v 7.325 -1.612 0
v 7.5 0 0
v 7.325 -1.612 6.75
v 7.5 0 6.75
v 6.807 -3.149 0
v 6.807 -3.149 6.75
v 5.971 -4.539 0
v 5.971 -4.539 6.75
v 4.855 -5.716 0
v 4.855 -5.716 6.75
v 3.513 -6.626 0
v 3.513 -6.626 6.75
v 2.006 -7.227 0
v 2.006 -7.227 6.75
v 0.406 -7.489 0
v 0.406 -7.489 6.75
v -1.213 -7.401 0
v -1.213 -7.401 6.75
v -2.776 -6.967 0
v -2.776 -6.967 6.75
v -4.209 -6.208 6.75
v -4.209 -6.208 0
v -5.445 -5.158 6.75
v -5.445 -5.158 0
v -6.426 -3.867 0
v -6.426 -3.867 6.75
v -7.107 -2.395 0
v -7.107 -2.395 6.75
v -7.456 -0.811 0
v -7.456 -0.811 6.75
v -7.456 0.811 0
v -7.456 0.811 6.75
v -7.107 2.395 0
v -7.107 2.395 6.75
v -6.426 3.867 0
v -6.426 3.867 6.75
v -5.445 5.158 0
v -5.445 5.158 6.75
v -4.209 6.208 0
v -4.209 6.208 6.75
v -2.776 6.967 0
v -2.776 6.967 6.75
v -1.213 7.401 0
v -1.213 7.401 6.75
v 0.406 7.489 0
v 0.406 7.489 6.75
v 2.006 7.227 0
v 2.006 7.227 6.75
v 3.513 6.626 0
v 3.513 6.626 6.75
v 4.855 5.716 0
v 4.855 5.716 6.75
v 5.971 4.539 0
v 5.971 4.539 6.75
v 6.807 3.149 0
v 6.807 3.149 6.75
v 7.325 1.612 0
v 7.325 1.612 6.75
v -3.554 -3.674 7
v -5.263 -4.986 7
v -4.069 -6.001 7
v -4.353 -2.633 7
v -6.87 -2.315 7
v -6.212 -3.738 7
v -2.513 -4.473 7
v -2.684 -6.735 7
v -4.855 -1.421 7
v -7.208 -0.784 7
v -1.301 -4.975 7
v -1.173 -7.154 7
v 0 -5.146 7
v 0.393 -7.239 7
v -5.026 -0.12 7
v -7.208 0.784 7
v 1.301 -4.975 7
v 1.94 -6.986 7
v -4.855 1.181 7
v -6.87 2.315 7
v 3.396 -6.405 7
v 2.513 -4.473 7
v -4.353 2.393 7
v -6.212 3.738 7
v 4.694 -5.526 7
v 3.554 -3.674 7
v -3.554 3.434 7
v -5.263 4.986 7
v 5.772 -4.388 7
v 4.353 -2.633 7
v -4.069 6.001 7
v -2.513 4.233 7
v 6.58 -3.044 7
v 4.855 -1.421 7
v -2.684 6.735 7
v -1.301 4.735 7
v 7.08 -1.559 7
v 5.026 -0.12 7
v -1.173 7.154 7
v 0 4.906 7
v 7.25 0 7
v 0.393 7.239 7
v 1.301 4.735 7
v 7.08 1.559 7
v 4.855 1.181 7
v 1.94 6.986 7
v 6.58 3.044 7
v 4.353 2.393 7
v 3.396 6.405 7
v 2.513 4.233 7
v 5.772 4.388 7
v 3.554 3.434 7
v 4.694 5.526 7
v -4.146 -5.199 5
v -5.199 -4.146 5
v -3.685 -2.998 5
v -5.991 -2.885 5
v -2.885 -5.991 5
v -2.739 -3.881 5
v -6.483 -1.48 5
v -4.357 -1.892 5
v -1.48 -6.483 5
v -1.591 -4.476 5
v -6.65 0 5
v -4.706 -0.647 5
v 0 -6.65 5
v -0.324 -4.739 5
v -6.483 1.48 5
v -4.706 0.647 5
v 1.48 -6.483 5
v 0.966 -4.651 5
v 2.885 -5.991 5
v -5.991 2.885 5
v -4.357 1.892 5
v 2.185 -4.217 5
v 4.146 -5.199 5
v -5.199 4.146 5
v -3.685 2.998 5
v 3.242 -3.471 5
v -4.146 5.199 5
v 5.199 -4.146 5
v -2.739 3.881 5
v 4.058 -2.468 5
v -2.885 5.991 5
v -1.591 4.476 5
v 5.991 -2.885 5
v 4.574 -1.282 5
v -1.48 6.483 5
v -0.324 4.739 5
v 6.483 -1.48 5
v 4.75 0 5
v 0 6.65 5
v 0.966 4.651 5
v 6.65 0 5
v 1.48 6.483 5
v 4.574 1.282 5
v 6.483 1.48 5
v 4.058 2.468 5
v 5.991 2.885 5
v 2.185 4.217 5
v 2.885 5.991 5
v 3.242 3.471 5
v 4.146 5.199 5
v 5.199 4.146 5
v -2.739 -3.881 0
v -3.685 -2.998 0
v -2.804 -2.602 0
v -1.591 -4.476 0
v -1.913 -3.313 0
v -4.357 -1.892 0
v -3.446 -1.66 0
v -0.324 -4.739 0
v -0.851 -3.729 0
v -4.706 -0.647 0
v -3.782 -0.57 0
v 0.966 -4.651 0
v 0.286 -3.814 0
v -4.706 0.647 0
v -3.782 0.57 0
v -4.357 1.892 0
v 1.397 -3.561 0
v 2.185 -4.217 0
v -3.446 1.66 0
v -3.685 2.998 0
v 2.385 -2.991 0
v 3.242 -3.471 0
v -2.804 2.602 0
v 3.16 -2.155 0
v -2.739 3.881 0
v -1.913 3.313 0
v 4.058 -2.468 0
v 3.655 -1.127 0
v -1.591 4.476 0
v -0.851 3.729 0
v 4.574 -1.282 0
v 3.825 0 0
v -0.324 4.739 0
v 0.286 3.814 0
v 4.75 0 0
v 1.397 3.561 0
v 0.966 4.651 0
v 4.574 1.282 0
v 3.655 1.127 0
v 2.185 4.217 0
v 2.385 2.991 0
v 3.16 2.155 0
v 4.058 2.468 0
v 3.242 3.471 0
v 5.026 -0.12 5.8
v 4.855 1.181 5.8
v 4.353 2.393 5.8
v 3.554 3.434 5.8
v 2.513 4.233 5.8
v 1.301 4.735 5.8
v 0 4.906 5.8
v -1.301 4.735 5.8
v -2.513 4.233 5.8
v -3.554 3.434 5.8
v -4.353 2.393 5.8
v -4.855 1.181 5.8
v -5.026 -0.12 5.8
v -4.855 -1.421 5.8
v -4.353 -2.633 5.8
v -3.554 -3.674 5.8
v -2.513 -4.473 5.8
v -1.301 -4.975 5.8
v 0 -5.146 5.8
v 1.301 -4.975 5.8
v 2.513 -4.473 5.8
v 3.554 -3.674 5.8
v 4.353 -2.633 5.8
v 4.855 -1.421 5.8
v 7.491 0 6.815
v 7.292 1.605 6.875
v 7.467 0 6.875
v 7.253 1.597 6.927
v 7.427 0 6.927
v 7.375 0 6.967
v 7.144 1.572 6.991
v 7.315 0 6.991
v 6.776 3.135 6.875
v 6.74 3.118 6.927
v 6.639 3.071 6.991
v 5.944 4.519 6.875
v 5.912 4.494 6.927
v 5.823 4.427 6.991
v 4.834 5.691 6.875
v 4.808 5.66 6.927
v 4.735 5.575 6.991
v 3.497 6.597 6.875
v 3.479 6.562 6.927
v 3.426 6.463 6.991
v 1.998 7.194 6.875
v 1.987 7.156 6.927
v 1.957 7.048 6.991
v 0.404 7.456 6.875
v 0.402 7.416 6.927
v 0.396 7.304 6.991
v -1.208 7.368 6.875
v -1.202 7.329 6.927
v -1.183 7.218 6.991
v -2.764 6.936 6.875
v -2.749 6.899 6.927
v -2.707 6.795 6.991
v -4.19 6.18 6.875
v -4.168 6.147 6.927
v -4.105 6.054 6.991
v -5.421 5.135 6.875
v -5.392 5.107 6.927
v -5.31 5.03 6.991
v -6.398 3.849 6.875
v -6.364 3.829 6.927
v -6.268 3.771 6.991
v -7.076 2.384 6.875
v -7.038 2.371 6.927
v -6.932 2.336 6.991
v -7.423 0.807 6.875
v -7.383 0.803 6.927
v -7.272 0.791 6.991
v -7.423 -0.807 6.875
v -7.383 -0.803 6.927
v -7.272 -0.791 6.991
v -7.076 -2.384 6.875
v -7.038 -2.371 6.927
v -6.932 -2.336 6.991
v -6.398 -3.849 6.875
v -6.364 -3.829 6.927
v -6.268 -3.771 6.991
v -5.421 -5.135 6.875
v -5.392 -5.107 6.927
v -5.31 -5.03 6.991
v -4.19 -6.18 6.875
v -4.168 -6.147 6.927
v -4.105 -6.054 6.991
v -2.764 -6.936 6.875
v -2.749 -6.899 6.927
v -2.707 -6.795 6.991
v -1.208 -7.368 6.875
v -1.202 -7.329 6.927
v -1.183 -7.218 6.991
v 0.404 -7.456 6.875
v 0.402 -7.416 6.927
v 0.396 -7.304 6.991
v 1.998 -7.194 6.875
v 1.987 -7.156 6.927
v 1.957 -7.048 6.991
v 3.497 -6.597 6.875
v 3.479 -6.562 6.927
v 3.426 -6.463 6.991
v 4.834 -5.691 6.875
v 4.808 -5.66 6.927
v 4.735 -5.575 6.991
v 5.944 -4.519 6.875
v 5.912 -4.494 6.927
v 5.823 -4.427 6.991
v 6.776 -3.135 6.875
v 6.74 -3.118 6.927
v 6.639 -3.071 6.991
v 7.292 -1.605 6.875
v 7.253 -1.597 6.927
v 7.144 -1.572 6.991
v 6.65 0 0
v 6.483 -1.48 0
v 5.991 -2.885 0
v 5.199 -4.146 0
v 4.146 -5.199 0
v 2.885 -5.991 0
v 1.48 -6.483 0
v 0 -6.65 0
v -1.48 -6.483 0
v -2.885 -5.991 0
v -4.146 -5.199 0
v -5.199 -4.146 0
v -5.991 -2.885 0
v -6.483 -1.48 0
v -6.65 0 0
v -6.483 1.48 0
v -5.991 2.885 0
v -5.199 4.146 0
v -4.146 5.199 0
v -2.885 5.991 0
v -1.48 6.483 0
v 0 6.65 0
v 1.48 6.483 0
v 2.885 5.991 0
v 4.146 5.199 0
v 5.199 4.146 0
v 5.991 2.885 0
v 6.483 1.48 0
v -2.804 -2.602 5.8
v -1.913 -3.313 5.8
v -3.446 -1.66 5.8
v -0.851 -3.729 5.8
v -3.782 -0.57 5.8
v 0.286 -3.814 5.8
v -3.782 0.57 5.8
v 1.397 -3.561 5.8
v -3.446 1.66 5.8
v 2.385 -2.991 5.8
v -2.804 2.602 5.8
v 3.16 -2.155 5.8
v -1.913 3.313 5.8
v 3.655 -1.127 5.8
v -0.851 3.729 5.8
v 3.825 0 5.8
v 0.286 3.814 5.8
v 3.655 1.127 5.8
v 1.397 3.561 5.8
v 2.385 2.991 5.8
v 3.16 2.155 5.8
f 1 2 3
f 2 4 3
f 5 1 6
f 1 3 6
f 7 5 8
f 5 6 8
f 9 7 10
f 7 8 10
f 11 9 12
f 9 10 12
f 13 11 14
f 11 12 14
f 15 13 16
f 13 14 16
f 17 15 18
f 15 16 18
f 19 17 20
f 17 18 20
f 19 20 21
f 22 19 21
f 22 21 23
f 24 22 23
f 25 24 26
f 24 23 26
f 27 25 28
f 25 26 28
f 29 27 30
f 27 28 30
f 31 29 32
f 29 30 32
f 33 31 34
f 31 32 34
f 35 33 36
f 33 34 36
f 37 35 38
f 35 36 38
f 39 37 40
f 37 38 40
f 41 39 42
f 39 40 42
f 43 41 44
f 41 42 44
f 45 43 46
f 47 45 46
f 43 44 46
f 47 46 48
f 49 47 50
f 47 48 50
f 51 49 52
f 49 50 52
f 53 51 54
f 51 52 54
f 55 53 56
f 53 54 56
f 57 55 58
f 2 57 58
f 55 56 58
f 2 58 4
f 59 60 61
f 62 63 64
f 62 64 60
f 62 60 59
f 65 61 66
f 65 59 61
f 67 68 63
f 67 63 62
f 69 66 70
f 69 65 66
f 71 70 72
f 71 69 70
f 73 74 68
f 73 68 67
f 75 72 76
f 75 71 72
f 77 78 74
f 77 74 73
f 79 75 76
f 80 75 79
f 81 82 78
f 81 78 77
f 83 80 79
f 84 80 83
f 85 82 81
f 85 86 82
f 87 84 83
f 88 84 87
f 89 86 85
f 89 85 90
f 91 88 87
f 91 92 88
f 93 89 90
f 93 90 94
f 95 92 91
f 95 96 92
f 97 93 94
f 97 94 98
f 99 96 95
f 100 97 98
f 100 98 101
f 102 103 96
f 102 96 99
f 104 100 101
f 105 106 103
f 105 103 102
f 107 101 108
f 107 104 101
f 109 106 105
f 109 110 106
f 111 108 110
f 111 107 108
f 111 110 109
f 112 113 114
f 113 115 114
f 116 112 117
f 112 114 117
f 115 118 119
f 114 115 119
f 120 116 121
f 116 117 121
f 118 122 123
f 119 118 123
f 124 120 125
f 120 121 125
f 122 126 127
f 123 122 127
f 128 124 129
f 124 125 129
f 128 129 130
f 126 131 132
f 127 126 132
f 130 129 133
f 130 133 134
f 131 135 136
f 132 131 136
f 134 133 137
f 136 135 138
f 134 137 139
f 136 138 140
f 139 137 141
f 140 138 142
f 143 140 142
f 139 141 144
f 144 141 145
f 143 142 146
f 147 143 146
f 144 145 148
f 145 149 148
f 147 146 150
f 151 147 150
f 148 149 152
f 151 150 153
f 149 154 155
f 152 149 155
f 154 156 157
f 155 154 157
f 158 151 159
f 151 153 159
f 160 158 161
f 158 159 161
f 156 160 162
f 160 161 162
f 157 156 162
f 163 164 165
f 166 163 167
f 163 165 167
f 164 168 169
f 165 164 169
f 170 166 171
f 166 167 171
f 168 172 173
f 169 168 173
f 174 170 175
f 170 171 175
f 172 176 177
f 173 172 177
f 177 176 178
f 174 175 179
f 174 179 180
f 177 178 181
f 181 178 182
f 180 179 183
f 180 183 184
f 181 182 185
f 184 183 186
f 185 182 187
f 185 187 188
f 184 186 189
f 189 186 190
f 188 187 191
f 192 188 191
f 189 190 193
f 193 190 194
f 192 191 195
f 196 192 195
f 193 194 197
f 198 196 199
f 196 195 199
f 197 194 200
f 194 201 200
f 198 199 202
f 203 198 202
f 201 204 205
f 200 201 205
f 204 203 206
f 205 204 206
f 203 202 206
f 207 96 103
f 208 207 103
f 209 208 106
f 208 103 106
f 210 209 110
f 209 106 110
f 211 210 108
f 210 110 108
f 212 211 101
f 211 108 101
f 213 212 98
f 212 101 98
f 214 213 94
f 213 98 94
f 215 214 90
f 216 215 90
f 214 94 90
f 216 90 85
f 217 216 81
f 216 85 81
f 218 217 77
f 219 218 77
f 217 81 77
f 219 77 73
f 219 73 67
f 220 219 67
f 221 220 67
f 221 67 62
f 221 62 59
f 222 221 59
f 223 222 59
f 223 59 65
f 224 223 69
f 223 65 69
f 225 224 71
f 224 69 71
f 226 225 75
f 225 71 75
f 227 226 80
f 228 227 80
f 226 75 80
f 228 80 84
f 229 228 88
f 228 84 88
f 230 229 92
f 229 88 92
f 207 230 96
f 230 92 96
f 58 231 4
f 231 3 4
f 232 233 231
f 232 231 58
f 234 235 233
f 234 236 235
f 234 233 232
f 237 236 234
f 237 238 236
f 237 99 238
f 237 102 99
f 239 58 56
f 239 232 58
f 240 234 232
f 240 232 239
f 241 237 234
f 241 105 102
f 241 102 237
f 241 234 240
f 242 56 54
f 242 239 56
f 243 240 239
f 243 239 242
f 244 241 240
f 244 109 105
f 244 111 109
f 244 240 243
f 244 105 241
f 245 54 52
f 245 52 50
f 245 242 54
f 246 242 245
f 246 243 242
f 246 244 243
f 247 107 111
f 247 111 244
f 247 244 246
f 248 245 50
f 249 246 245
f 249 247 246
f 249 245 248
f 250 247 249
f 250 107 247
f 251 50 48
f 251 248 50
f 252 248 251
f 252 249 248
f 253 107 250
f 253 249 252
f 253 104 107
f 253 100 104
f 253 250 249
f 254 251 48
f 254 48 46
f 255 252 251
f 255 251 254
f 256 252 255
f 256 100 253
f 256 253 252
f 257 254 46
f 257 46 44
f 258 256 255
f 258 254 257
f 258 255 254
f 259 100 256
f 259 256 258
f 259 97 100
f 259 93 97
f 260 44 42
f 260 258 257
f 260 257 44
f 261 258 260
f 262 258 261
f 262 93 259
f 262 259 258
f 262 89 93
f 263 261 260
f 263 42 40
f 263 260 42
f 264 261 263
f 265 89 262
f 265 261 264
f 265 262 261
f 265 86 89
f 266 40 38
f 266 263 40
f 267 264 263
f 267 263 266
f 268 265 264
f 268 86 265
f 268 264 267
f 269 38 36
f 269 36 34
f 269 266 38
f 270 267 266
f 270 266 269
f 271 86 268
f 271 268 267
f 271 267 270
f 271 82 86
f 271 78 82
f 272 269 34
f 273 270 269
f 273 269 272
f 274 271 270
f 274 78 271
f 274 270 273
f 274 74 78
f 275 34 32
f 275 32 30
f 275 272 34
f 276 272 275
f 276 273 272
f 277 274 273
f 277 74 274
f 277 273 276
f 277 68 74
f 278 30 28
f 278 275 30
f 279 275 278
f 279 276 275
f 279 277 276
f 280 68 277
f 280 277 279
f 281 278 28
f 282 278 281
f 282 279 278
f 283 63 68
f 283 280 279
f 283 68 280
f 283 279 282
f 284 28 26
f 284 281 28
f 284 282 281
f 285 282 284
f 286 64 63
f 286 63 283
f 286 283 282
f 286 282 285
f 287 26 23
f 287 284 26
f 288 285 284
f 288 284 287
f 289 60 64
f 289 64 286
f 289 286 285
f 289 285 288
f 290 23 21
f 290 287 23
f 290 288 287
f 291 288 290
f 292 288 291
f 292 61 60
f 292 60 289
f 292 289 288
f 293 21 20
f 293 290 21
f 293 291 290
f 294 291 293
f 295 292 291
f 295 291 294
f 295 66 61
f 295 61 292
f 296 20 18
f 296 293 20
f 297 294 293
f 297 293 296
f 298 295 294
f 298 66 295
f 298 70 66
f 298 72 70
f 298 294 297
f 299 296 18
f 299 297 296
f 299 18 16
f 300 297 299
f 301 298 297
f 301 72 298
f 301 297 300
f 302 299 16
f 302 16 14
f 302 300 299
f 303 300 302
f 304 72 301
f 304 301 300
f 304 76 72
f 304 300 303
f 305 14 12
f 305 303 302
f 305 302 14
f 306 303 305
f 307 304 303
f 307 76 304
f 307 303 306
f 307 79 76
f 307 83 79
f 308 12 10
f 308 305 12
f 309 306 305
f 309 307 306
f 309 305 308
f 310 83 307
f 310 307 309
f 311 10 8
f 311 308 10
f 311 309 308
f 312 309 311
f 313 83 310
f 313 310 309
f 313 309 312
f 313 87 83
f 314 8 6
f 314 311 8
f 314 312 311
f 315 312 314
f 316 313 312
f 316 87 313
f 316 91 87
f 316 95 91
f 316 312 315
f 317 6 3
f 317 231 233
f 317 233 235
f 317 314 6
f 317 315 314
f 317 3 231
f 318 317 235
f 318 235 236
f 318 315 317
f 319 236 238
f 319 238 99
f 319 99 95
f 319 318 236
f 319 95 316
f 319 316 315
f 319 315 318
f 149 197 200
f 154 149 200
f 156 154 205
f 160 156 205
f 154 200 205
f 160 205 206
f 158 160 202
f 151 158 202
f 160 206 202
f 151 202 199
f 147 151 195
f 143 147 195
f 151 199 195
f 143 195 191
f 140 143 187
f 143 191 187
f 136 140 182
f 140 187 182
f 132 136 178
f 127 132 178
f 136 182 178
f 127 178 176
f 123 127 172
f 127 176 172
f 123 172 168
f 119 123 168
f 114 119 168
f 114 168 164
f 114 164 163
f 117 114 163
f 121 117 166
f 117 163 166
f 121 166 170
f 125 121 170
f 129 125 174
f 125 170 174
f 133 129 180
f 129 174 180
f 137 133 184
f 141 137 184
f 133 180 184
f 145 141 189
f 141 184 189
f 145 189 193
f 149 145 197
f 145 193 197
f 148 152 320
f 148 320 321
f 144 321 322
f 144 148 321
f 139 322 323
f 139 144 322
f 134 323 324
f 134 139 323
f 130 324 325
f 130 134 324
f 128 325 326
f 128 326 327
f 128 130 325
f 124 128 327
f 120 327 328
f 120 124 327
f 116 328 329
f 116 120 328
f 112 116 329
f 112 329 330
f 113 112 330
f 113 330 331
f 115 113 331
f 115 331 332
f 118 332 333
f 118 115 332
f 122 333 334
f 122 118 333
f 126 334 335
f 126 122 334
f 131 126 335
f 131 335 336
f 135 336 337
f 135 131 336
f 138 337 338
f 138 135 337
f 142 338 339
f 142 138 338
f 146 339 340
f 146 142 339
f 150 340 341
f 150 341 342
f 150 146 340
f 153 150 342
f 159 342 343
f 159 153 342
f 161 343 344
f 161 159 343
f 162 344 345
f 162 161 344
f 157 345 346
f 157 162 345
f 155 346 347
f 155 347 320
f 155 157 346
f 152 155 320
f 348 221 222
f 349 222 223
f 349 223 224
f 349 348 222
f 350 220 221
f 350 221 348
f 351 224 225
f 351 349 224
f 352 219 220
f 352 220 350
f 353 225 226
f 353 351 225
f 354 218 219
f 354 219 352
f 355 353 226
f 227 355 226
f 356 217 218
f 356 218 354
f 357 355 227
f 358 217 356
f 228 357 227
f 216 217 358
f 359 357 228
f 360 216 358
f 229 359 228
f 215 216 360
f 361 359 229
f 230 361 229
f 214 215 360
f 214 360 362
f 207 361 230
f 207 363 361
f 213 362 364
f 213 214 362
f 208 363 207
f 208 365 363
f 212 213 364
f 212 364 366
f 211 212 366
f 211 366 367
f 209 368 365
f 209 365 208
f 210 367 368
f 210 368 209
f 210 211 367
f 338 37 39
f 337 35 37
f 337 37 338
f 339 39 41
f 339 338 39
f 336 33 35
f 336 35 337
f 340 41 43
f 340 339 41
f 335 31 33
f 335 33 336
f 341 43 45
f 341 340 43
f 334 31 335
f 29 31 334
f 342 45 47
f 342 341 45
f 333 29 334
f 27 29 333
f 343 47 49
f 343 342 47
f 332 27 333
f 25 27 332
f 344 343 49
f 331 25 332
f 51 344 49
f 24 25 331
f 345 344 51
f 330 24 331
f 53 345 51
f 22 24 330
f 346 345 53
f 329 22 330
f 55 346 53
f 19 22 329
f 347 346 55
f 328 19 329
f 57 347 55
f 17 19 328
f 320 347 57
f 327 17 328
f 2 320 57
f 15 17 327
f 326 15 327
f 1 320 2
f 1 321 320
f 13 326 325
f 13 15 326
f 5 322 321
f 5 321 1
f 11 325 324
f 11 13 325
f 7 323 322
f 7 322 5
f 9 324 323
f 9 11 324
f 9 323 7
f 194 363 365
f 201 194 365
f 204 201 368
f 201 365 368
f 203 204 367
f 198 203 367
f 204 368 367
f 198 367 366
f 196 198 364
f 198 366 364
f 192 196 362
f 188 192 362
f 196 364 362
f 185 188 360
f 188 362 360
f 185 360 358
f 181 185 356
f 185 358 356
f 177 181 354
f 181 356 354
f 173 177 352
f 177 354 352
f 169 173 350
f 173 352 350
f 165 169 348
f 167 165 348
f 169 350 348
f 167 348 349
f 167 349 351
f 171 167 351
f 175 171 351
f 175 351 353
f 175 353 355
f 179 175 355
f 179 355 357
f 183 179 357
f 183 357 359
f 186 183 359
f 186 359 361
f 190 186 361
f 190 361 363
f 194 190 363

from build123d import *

# Parameters (mm, degrees)
F0_R      = 4.75
F1_DEPTH  = 5
F2_R      = 7.5
F3_DEPTH  = 2
F4_R      = 3.825
F5_DEPTH  = 25
F6_R      = 0.25
F7_R      = 7.5
F7_R_2    = 6.65
F8_DEPTH  = 5
F9_R      = 5.0264335275
F9_R_2    = 3.825
F10_DEPTH = 1.2


with BuildPart() as f1:
    # F0 (on Top) → F1 (new body)
    with BuildSketch(Plane.XY):
        Circle(F0_R)
    extrude(amount=F1_DEPTH)

    # F2 (on face) → F3 (join)
    with BuildSketch(Plane.XY.offset(5)):
        Circle(F2_R)
    extrude(amount=F3_DEPTH)

    # F4 (on face) → F5 (cut)
    with BuildSketch(Plane.XY.offset(7)):
        Circle(F4_R)
    extrude(amount=-F5_DEPTH, mode=Mode.SUBTRACT)

    # F6
    f6_edges = [f1.edges().sort_by_distance(p)[0] for p in [
        (-7.5, 0, 7),
    ]]
    fillet(f6_edges, radius=F6_R)

    # F7 (on face) → F8 (join)
    with BuildSketch(Plane(origin=(0, 0, 5), x_dir=(1, 0, 0), z_dir=(0, 0, -1))):
        Circle(F7_R)
        Circle(F7_R_2, mode=Mode.SUBTRACT)
    extrude(amount=F8_DEPTH)

    # F9 (on face) → F10 (cut)
    with BuildSketch(Plane.XY.offset(7)):
        with Locations((0, -0.1200375191)):
            Circle(F9_R)
        Circle(F9_R_2, mode=Mode.SUBTRACT)
    extrude(amount=-F10_DEPTH, mode=Mode.SUBTRACT)


solid = f1.part
